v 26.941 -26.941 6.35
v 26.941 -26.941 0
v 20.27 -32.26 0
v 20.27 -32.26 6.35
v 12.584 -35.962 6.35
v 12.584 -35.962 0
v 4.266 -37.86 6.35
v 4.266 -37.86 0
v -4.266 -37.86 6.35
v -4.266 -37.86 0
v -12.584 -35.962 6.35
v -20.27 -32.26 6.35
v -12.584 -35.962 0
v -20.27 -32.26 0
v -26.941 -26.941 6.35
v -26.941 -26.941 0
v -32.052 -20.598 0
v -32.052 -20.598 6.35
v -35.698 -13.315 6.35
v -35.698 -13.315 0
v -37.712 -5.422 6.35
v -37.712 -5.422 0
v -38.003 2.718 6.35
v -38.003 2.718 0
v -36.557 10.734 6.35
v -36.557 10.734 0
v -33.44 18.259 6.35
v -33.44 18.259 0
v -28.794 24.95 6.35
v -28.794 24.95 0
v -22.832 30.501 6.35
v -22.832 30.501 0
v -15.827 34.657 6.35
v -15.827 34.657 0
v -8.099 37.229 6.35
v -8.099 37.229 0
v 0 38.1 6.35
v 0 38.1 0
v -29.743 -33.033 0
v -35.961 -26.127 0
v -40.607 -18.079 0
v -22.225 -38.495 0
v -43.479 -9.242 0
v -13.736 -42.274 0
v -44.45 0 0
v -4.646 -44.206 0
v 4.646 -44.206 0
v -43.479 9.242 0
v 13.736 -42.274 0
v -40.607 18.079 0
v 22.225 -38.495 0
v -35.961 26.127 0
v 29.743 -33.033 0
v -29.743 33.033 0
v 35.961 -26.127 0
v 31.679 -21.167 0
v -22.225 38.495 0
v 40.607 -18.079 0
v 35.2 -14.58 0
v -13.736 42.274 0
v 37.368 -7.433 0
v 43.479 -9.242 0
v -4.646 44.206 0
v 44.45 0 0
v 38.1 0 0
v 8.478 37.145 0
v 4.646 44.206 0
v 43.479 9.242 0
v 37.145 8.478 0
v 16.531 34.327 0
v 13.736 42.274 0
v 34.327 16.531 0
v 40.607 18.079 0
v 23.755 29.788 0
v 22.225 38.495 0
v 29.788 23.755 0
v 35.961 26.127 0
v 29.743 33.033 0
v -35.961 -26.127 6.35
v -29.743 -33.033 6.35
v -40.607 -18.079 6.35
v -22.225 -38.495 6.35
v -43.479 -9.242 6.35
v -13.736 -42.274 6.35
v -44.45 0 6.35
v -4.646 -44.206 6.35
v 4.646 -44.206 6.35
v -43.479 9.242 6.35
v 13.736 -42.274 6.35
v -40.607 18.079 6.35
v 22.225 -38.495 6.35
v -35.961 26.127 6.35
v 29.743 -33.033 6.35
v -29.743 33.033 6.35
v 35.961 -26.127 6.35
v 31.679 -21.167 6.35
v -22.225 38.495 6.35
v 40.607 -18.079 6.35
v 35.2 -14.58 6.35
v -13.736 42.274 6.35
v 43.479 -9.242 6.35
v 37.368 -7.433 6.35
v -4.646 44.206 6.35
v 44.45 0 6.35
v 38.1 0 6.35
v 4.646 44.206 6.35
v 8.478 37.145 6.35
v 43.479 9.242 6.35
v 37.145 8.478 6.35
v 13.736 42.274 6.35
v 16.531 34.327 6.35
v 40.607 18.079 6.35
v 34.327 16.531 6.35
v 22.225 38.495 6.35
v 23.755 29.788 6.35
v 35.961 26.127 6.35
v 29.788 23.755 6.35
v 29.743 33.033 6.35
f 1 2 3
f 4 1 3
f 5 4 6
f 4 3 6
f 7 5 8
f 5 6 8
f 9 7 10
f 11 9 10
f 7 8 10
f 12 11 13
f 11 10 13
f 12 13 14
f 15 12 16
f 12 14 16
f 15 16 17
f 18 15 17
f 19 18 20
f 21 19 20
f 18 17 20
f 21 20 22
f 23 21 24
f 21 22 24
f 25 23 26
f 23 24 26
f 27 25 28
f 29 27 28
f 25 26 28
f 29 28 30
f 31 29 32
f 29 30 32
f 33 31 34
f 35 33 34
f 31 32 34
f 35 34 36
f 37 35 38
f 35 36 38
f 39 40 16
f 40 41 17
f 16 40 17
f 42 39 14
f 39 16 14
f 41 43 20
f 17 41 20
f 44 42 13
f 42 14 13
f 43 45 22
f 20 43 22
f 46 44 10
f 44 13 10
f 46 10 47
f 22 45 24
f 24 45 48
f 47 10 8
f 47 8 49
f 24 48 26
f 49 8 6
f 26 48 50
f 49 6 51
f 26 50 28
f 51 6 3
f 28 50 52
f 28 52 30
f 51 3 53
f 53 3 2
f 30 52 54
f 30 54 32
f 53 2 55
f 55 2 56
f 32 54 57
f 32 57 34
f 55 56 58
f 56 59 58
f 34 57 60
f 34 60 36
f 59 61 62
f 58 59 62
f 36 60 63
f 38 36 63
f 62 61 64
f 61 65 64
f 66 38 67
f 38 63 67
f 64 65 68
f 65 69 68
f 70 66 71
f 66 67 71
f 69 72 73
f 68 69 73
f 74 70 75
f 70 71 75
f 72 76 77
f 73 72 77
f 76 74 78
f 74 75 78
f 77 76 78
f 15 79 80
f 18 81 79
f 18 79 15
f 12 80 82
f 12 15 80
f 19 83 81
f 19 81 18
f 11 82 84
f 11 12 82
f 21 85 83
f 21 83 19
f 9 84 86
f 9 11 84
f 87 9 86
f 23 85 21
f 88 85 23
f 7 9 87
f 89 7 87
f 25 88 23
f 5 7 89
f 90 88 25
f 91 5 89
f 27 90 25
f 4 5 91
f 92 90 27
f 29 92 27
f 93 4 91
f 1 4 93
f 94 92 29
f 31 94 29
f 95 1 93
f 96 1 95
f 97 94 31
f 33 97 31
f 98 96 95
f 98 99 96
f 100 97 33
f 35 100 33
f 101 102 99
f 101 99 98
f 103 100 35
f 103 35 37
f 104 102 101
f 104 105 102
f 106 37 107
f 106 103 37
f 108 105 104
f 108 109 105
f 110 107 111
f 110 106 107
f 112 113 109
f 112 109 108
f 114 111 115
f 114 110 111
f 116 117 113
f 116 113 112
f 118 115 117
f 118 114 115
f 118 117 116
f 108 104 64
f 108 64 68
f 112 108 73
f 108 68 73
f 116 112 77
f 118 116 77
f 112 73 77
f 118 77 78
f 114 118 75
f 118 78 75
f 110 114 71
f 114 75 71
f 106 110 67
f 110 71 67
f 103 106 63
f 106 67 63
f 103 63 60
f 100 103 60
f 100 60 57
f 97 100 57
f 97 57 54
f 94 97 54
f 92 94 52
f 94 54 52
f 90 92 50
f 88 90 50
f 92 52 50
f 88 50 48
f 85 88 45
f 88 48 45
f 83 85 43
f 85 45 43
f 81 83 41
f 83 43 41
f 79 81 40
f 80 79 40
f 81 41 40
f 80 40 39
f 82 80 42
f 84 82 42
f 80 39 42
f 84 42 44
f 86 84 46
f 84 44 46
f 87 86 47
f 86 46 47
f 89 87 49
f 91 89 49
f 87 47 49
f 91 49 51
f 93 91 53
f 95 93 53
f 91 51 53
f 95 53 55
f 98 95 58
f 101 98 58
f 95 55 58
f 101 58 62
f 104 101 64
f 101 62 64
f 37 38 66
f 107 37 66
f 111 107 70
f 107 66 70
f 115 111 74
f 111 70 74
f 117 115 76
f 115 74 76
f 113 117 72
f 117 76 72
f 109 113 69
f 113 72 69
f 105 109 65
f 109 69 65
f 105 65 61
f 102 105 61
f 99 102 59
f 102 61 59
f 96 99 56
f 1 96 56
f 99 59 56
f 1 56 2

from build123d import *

# Parameters (mm, degrees)
F0_R     = 44.45
F1_DEPTH = 6.35


with BuildPart() as f1:
    # F0 (on Top) → F1 (new body)
    with BuildSketch(Plane.XY):
        Circle(F0_R)
        with BuildLine():
            ThreePointArc((26.940768, -26.940768), (0, -38.1), (-26.940768, -26.940768))
            ThreePointArc((-26.940768, -26.940768), (-35.19981, 14.580239), (0, 38.1))
            ThreePointArc((0, 38.1), (26.940768, 26.940768), (38.1, 0))
            ThreePointArc((38.1, 0), (35.19981, -14.580239), (26.940768, -26.940768))
        make_face(mode=Mode.SUBTRACT)
    extrude(amount=F1_DEPTH)


solid = f1.part
